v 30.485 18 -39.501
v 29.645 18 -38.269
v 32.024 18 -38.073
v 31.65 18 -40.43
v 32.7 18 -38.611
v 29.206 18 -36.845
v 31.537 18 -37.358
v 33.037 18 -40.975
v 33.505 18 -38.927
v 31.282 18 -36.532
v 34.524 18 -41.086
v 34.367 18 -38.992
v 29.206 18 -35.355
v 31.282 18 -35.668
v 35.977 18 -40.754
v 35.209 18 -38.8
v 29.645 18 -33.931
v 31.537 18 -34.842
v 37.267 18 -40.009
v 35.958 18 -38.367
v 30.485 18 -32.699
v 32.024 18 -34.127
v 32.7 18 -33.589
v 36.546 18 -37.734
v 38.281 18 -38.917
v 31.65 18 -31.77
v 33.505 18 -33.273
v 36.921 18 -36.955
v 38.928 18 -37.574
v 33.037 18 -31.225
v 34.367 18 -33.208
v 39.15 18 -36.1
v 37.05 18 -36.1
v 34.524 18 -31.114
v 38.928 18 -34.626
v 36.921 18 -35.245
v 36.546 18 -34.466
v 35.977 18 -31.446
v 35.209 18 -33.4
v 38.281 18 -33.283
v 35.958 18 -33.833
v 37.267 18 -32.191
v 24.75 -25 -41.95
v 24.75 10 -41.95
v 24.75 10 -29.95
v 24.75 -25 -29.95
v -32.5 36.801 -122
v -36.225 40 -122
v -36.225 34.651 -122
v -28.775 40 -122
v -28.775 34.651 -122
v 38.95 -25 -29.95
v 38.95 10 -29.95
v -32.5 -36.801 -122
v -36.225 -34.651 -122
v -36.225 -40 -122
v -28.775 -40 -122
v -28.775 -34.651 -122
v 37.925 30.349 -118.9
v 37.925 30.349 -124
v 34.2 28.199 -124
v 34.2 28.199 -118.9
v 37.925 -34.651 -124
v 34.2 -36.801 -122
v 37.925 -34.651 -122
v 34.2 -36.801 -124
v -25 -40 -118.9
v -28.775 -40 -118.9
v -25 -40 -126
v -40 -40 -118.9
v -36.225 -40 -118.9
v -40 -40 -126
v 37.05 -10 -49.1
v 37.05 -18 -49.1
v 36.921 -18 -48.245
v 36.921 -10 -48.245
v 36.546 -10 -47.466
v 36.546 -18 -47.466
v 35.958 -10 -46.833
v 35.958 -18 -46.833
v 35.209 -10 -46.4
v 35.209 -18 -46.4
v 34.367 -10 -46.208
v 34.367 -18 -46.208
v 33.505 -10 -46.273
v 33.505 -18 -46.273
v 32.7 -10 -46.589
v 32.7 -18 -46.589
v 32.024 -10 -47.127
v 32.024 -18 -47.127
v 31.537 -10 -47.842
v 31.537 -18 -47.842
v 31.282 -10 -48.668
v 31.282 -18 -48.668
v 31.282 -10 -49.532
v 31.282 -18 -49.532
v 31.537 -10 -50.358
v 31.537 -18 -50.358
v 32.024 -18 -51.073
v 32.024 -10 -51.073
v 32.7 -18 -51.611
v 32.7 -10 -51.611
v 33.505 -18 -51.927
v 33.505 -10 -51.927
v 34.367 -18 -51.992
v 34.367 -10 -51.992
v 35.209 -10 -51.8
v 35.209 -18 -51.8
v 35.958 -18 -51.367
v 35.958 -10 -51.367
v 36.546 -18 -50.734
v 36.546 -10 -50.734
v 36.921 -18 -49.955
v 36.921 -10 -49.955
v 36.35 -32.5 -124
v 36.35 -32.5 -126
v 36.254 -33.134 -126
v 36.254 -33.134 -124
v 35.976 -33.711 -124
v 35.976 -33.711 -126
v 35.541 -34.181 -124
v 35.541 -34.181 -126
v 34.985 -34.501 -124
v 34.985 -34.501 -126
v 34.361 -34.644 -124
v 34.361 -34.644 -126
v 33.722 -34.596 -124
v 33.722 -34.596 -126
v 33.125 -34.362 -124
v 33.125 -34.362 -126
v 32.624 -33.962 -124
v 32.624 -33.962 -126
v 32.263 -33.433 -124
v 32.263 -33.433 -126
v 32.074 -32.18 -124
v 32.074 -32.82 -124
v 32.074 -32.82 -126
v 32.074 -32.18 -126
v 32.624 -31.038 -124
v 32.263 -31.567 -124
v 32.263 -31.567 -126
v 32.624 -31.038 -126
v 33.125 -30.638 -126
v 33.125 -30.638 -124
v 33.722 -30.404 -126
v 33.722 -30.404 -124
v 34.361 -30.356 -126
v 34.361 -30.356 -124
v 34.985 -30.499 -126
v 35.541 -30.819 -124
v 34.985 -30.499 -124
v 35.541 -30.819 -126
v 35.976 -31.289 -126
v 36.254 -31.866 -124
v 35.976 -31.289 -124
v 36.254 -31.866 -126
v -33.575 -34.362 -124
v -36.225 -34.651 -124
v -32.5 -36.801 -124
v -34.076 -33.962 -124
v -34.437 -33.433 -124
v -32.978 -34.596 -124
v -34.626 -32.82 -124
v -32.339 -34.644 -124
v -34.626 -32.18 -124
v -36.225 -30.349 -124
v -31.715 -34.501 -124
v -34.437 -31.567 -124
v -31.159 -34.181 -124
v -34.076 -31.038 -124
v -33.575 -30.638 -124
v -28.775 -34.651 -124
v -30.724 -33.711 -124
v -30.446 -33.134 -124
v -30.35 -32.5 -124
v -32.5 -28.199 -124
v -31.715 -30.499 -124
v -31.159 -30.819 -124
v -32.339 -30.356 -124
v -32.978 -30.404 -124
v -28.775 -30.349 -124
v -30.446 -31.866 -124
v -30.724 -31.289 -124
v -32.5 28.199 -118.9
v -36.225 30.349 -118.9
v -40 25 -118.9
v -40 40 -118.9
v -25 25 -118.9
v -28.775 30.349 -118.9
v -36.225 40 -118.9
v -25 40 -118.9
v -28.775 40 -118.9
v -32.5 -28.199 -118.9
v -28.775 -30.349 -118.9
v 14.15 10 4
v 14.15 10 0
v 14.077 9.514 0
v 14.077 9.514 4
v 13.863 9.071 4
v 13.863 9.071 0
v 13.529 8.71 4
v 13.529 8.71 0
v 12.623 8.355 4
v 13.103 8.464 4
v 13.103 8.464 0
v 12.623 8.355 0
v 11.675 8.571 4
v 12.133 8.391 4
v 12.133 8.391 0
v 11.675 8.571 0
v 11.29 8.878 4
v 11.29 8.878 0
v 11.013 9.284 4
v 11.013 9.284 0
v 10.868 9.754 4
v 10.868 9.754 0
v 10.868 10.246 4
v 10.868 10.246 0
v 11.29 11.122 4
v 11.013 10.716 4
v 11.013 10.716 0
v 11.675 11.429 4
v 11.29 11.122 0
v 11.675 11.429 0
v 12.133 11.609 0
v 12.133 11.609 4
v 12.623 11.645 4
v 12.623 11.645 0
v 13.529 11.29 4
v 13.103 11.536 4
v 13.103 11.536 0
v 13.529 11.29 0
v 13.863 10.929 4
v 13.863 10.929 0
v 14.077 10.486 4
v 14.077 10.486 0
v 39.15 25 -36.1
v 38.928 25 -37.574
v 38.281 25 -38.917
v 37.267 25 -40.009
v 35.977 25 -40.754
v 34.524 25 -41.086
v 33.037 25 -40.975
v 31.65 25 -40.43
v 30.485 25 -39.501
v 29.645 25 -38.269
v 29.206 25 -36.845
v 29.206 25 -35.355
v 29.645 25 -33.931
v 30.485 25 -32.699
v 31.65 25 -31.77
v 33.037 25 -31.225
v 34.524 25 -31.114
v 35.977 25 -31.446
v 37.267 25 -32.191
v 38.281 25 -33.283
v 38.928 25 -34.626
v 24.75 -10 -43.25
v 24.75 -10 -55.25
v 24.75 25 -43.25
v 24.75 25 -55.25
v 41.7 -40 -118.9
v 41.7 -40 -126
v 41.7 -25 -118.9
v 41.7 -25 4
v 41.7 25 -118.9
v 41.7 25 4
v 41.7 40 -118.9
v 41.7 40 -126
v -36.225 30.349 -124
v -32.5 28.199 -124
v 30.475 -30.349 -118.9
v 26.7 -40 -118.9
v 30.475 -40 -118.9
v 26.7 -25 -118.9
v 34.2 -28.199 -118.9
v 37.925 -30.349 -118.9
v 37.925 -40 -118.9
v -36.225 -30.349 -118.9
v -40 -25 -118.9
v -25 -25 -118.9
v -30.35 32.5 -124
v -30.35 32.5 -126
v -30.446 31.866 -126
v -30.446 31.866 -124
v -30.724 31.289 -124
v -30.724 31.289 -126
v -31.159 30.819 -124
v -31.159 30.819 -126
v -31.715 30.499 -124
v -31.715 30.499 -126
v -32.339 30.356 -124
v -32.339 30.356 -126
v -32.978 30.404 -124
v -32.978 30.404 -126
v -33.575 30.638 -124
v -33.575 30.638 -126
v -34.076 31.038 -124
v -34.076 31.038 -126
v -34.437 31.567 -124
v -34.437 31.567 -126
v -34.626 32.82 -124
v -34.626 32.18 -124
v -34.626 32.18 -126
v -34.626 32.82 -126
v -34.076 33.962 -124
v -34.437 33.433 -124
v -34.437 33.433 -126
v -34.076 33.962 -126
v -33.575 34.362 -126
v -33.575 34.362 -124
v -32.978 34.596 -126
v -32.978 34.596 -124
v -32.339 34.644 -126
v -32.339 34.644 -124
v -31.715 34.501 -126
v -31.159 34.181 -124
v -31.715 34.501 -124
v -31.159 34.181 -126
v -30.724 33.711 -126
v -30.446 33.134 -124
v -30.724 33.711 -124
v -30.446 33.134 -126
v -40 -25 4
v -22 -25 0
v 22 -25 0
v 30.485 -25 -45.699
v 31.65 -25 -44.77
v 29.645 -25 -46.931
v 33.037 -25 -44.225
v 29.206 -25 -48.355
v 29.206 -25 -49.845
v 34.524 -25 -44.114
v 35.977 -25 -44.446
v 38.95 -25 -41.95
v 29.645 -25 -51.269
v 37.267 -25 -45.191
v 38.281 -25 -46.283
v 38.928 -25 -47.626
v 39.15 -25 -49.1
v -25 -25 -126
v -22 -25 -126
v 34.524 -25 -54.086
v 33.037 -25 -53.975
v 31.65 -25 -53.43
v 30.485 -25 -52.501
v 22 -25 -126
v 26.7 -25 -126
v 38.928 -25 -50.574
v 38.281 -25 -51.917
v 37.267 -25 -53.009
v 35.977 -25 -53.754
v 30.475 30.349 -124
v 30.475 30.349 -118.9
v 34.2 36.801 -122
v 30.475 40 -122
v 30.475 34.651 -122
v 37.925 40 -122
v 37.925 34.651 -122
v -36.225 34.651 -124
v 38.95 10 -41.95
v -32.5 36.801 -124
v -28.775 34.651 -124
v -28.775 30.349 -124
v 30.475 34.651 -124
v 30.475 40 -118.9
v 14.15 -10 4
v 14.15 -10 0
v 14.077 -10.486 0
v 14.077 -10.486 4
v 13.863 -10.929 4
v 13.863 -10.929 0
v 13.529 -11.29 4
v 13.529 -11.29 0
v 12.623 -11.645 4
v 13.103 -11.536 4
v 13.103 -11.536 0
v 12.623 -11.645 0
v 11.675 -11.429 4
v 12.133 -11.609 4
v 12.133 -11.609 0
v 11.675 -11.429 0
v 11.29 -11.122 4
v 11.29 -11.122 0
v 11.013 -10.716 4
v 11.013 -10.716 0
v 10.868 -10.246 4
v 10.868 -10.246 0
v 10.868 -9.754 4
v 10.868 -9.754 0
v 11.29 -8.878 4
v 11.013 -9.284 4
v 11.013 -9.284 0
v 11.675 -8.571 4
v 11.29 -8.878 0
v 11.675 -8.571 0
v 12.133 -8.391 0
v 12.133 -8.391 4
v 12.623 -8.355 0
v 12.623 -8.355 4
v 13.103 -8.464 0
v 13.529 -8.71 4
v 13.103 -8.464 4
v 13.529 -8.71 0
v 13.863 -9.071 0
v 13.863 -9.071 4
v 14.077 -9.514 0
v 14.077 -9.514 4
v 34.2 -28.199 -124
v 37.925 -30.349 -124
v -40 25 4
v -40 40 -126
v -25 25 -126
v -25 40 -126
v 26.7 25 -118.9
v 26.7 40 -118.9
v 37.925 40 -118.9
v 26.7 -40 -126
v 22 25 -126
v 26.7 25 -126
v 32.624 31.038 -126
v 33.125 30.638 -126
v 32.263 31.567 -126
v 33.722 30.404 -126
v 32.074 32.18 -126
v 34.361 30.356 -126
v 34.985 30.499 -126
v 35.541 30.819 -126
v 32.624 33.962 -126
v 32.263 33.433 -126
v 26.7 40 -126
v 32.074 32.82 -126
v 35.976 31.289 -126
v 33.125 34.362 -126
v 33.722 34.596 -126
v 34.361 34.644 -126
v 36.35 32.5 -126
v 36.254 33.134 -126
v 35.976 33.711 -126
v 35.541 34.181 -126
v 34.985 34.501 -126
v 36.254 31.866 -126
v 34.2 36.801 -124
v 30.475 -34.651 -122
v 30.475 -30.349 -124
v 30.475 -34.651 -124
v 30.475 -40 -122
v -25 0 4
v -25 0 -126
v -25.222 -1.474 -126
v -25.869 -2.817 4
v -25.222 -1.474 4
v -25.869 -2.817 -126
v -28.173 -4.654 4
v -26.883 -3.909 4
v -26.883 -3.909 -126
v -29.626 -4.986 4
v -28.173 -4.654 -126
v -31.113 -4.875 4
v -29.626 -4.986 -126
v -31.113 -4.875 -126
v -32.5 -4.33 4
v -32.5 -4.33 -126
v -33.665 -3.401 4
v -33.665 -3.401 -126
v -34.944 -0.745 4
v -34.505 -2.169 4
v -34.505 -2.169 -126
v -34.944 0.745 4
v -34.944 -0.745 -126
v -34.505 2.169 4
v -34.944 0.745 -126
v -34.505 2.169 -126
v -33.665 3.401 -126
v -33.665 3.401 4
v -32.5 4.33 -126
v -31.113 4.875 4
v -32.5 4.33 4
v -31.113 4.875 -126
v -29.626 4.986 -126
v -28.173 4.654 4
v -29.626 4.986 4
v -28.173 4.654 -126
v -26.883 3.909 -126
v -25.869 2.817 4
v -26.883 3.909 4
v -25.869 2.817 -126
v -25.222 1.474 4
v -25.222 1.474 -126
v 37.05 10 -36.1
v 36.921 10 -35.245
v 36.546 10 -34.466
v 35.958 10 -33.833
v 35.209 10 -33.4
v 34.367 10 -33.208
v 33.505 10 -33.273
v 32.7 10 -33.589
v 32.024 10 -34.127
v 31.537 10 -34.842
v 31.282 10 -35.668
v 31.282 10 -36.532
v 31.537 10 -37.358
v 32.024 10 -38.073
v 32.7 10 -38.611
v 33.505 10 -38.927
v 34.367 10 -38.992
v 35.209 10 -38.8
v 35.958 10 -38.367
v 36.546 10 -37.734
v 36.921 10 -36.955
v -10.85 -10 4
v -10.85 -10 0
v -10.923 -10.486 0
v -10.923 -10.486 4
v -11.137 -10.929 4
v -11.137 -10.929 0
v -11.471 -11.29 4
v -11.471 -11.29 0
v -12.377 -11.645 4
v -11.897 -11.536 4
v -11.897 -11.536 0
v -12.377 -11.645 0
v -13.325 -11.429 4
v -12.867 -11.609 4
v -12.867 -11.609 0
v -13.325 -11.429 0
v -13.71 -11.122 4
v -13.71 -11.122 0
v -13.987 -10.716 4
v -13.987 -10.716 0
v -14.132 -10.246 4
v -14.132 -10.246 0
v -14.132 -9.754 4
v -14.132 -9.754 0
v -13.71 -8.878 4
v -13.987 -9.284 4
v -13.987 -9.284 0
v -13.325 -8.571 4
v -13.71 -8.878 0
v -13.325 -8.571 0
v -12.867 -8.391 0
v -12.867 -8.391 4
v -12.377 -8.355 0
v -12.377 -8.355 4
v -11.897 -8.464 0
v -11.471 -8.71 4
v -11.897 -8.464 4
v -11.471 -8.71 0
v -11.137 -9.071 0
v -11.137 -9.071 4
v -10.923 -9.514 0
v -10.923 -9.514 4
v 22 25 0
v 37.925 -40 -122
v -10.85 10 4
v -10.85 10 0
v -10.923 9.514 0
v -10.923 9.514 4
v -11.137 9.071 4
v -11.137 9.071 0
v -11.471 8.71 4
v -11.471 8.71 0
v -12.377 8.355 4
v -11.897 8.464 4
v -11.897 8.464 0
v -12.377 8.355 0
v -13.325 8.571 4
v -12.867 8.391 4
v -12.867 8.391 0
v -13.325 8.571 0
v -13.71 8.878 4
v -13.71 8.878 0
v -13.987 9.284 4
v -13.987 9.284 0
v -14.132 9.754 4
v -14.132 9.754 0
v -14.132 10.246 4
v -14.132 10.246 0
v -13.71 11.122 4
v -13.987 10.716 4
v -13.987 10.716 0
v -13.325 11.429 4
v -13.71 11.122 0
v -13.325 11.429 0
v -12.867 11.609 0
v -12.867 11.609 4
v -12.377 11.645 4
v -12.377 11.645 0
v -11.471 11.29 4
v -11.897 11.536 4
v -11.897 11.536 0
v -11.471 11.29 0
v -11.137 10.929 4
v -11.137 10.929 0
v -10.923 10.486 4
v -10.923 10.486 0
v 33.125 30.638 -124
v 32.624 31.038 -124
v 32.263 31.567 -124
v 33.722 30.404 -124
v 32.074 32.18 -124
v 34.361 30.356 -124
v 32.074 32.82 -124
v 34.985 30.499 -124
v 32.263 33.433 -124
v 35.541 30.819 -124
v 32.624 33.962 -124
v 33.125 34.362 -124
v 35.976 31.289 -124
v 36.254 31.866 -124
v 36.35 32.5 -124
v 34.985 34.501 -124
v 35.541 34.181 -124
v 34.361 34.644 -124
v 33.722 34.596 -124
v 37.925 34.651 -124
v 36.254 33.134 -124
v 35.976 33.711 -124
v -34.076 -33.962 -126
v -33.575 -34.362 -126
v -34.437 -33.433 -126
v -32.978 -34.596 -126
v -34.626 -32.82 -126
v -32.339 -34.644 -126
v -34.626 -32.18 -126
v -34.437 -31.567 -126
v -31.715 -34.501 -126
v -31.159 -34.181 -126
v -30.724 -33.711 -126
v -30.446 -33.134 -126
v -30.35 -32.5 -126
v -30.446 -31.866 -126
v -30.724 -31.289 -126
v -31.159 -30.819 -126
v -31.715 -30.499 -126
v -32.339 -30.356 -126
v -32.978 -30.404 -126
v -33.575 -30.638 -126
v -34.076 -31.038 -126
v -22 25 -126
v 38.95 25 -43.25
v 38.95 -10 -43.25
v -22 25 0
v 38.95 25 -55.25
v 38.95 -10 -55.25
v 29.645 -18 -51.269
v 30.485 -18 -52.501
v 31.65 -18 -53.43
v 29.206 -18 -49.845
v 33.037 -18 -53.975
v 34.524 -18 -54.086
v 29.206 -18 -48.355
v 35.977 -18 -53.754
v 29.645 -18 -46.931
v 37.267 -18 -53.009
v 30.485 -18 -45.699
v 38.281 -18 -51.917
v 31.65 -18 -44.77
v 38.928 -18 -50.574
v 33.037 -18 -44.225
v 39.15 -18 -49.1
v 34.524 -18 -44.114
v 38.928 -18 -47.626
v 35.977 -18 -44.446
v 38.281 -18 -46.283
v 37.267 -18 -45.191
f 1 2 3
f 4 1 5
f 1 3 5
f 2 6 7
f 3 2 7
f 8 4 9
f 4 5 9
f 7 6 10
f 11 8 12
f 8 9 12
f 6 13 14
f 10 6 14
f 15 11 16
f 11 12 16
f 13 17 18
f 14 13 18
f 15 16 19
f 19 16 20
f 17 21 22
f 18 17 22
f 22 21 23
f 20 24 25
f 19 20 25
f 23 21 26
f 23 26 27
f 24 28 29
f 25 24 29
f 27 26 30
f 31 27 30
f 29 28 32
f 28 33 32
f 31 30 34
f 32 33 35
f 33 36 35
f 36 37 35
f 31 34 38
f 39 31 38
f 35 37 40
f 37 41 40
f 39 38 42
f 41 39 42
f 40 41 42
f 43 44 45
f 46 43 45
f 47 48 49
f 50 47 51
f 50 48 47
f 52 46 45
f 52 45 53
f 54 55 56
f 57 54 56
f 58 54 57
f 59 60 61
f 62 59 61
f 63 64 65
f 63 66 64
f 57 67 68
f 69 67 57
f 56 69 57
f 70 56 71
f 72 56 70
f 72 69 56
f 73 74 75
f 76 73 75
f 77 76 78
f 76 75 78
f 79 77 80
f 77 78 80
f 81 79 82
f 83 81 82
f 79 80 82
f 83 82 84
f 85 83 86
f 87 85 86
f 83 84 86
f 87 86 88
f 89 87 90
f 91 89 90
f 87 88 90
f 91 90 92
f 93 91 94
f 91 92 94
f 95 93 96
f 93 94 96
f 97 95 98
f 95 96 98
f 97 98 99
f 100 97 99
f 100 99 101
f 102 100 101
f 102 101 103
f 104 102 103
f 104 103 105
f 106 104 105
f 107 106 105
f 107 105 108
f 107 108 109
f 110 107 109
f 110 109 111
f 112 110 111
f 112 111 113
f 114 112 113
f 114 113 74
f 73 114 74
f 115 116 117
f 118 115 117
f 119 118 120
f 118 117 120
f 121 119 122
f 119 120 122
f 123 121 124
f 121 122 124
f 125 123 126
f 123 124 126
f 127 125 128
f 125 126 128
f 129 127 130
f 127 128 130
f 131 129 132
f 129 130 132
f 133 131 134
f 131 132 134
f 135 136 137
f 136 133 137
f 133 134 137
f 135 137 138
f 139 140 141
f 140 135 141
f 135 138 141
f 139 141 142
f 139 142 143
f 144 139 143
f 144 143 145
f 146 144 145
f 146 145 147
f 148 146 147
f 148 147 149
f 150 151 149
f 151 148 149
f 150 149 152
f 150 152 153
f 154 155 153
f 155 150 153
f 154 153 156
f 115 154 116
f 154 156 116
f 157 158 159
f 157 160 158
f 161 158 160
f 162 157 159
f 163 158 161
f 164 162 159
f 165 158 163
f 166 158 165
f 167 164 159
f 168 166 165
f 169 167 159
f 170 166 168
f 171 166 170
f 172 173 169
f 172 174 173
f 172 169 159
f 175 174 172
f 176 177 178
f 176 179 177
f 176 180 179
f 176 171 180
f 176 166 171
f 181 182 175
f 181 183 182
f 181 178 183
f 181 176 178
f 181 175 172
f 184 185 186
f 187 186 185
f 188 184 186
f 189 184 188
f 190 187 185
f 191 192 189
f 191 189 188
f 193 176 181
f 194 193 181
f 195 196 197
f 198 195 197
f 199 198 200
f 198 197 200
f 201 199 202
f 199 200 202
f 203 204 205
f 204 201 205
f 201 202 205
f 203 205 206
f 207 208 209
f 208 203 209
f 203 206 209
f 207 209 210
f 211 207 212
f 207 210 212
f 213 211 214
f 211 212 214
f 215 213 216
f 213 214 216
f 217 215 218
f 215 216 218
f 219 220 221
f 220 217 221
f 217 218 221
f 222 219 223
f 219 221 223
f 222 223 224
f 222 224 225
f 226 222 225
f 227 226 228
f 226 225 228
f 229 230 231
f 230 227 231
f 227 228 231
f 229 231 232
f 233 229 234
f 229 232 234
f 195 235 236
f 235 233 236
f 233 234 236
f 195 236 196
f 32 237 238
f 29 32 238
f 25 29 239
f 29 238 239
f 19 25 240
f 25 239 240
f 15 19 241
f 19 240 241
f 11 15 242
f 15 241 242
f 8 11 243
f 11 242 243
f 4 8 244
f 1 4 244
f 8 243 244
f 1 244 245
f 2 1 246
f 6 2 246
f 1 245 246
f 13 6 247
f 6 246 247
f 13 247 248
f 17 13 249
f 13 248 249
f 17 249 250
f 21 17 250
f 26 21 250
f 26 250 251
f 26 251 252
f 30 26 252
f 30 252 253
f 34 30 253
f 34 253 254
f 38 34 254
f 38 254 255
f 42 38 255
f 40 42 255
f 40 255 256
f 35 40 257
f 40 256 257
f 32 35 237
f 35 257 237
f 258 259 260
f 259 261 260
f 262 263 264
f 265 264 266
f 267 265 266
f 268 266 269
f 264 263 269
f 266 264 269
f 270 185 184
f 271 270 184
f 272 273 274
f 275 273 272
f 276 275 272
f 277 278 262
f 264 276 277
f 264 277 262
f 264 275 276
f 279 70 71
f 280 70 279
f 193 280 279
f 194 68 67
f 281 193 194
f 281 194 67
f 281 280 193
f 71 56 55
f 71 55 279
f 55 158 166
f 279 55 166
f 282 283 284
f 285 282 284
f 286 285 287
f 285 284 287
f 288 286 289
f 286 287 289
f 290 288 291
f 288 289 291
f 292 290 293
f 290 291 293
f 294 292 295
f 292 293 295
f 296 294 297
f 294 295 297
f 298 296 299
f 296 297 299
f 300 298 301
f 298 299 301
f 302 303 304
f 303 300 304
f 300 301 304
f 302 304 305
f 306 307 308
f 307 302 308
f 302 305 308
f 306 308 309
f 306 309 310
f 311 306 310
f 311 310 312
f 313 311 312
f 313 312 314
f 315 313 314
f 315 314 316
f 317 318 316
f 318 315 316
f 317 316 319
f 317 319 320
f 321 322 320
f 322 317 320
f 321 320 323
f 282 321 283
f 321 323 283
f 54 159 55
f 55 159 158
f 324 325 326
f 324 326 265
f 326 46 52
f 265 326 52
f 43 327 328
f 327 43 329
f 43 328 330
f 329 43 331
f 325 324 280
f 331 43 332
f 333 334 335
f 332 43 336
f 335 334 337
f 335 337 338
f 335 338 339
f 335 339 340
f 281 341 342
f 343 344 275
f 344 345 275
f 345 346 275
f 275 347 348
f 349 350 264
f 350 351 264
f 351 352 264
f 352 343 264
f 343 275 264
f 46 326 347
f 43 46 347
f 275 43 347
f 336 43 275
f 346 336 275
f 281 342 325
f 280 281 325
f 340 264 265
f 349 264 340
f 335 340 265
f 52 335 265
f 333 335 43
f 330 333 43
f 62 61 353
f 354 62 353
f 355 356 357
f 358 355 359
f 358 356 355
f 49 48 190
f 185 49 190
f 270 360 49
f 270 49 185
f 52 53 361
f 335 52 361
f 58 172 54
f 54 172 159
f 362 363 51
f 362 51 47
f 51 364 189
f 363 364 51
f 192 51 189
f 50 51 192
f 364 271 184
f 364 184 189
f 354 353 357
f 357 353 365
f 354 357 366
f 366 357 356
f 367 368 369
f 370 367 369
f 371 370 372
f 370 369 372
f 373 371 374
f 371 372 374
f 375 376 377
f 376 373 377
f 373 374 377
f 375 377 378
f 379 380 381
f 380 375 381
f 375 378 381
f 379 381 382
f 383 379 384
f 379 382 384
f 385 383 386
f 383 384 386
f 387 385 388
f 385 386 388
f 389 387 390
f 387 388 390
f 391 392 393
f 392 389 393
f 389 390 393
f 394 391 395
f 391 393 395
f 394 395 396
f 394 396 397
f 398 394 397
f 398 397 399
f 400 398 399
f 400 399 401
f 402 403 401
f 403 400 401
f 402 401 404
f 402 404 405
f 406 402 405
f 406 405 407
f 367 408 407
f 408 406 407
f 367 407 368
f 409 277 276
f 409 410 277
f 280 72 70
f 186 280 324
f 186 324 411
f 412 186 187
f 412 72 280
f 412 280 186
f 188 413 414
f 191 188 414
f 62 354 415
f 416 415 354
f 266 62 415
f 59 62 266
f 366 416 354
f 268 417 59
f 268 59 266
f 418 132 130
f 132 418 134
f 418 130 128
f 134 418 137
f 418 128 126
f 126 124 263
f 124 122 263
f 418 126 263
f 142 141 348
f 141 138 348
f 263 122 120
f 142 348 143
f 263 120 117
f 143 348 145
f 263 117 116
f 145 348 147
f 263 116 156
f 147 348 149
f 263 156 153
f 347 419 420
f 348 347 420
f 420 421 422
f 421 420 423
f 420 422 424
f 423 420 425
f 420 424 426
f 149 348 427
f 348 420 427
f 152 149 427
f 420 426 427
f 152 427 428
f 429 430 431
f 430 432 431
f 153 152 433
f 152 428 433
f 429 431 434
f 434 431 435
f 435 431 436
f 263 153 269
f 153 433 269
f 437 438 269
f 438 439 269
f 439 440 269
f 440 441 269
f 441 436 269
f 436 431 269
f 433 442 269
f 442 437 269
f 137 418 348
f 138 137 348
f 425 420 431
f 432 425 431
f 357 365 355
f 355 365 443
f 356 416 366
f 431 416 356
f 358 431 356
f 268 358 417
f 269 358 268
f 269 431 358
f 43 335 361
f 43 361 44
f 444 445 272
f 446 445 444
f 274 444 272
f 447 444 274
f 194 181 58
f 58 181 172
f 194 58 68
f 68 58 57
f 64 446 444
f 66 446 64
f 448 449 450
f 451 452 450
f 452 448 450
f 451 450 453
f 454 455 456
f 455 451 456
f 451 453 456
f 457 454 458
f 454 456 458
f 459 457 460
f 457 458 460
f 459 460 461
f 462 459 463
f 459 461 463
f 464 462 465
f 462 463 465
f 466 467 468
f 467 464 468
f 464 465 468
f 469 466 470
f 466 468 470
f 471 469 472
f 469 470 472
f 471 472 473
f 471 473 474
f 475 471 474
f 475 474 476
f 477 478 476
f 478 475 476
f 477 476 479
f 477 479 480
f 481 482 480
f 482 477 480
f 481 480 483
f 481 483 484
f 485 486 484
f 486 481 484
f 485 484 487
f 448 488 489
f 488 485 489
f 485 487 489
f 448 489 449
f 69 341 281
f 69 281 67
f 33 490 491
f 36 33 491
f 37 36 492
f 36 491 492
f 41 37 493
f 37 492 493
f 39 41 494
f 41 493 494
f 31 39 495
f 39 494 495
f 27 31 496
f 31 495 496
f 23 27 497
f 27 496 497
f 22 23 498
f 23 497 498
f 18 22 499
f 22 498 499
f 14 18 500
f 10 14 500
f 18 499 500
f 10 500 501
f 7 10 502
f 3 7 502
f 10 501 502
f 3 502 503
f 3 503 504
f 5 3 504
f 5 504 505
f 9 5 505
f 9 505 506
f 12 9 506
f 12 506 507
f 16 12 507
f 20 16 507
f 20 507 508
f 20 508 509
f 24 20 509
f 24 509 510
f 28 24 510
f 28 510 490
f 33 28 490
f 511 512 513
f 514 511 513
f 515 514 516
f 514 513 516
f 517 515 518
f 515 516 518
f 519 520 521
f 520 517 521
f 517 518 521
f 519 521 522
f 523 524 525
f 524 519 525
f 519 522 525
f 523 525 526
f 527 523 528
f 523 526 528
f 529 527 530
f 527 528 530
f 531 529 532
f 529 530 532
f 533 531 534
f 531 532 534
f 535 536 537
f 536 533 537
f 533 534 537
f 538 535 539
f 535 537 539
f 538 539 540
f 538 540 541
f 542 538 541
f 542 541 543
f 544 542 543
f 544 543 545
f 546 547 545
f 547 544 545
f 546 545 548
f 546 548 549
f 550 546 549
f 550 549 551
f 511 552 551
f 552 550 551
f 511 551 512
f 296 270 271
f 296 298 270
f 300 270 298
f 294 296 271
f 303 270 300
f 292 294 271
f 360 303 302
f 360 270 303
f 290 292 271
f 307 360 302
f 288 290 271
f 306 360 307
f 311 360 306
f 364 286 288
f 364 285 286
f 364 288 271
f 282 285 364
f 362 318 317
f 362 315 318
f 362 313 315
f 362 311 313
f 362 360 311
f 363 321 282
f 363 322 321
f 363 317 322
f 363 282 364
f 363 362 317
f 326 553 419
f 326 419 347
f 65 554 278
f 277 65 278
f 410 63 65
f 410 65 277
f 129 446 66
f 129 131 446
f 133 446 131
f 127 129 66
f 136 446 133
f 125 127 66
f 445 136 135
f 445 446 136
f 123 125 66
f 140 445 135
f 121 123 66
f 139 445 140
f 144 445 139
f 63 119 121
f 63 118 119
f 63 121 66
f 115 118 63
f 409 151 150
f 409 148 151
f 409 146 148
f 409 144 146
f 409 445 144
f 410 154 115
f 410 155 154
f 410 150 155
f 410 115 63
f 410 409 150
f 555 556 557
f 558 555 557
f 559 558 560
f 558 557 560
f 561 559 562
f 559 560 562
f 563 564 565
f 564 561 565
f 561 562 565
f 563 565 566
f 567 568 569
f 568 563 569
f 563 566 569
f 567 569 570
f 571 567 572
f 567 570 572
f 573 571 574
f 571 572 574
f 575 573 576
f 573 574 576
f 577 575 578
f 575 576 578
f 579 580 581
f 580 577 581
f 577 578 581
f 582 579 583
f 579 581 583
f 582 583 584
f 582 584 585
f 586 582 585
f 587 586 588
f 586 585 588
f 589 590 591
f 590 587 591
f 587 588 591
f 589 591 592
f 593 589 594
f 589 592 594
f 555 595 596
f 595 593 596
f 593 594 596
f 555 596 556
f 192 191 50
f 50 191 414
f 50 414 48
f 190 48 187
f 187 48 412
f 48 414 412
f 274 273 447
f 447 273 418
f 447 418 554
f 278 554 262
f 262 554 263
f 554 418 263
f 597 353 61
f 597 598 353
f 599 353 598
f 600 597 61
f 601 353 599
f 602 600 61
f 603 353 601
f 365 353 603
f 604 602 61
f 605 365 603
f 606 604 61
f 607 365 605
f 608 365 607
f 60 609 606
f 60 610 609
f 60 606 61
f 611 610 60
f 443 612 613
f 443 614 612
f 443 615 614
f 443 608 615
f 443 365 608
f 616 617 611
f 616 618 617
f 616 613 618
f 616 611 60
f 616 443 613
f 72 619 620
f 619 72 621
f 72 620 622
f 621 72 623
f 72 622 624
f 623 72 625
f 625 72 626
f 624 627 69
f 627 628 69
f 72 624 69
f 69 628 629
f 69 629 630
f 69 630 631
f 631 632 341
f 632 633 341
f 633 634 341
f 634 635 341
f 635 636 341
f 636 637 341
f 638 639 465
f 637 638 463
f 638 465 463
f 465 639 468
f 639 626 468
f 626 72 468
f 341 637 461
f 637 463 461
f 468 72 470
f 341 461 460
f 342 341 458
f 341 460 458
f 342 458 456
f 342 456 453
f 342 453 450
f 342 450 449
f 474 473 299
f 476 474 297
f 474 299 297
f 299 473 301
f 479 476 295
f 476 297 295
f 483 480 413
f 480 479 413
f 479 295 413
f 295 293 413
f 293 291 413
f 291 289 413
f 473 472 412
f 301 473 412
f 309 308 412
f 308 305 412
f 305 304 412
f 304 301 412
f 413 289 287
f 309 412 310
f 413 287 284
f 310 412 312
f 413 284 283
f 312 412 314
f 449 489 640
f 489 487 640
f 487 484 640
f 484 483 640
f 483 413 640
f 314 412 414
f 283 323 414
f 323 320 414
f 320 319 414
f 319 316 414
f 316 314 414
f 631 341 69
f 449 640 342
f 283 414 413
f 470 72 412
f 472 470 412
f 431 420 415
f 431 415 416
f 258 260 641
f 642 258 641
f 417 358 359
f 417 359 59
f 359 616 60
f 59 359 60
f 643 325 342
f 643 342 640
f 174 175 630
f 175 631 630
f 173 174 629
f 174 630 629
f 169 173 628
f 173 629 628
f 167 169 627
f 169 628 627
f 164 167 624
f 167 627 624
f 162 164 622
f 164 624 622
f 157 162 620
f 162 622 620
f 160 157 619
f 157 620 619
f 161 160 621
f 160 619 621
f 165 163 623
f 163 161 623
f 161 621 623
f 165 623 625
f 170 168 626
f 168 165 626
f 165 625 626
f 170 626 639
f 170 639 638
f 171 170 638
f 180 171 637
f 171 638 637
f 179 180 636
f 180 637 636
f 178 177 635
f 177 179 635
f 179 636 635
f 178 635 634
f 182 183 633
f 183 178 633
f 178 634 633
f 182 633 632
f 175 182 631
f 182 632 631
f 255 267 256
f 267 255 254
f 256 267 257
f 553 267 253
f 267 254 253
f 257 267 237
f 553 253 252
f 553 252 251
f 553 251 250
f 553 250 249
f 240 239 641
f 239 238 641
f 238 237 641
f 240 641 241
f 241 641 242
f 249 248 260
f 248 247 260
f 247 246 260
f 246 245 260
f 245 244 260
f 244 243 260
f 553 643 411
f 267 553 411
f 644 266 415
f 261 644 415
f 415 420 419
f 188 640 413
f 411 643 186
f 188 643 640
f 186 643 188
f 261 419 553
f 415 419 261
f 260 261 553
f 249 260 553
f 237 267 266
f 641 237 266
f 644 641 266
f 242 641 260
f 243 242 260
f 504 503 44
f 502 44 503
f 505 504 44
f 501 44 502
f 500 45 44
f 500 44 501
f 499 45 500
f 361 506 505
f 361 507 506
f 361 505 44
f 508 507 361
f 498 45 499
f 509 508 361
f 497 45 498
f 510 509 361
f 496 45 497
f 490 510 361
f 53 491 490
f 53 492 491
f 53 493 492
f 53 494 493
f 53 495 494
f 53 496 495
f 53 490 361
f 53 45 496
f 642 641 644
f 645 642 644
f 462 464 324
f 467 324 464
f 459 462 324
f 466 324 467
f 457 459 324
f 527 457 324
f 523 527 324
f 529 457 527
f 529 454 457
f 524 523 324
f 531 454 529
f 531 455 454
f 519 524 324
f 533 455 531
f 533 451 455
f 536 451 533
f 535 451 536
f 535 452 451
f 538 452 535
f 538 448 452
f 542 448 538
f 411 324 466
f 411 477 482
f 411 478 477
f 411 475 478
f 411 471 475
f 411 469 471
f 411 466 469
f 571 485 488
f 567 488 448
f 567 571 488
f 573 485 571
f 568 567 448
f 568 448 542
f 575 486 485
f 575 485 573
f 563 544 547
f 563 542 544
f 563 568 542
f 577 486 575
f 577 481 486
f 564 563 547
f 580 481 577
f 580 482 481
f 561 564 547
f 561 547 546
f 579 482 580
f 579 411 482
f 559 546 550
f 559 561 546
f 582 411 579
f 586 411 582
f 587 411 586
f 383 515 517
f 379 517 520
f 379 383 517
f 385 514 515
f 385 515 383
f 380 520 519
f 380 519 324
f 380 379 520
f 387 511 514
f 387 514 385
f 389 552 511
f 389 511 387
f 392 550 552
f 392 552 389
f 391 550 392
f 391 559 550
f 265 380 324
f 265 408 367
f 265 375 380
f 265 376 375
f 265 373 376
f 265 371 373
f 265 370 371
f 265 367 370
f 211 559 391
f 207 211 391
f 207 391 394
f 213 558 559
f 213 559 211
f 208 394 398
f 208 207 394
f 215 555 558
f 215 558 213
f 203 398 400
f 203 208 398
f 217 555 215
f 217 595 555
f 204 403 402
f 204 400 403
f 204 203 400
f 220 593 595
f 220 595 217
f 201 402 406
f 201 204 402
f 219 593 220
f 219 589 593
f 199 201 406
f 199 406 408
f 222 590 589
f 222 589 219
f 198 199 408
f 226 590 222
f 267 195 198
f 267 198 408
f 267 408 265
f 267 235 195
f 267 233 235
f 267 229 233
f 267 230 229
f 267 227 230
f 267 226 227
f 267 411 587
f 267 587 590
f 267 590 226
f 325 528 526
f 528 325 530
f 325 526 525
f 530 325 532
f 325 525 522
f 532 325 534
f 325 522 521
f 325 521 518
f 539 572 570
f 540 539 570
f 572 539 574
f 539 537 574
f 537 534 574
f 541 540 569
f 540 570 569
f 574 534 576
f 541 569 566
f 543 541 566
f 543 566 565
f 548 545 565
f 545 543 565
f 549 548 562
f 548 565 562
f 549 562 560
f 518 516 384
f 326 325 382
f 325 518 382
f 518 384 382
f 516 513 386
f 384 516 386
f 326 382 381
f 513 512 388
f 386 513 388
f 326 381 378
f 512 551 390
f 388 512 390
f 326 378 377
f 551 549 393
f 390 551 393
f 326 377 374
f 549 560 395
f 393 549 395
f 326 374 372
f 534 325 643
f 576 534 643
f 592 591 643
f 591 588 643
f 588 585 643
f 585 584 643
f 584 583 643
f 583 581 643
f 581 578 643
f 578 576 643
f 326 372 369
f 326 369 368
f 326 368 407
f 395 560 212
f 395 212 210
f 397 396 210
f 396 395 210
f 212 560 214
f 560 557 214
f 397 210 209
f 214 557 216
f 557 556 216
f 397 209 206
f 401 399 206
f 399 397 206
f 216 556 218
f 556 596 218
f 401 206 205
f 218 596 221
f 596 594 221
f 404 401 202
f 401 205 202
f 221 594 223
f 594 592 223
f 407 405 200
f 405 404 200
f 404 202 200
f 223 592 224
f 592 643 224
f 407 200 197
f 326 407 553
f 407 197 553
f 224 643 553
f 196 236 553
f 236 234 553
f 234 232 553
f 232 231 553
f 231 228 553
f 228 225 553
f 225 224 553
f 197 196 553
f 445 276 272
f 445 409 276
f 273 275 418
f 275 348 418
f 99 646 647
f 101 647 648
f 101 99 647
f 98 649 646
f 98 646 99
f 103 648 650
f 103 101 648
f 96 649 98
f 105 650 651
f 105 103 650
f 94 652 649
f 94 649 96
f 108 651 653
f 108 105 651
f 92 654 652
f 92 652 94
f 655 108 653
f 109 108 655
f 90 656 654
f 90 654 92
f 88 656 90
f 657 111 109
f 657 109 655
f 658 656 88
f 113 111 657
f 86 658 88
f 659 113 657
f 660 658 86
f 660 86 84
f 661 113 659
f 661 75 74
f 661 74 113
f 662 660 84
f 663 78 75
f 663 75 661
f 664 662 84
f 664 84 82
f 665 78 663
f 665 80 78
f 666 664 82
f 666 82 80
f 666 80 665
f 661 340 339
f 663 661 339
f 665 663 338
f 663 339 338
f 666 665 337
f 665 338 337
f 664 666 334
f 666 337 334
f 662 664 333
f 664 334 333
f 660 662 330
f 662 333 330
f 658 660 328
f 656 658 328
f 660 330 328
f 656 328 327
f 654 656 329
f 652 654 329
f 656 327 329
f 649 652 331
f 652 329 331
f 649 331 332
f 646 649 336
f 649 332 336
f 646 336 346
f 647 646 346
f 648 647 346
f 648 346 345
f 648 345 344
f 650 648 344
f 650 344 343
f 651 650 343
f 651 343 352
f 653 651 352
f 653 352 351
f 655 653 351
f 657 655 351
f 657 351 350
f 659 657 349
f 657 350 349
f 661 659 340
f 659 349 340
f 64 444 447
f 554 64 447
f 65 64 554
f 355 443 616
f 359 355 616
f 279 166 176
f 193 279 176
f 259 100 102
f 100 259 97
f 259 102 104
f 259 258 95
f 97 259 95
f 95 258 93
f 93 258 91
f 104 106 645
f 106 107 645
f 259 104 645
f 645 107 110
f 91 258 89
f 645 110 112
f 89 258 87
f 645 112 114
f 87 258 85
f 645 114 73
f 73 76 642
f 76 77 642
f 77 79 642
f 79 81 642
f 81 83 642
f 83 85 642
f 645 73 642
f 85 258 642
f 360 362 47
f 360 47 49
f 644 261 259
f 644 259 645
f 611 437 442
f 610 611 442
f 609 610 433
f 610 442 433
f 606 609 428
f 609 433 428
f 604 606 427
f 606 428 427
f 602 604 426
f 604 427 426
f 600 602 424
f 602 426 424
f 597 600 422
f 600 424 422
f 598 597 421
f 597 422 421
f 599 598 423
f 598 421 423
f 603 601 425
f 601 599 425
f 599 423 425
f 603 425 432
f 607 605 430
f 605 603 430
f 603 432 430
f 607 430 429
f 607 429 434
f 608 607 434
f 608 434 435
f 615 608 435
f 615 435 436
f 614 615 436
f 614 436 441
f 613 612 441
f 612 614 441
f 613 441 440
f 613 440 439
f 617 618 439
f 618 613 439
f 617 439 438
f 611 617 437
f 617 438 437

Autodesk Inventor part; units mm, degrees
sketch "S-ProbeHead-BaseSkizze" plane through (0, 0, 0) normal (0, 0, 1) x (1, 0, 0)
  line L0 (-40, 40) -> (40, 40)
  line L1 (40, 40) -> (40, -40)
  line L2 (40, -40) -> (-40, -40)
  line L3 (-40, -40) -> (-40, 40)
  line L4 (-40, 40) -> (40, -40) construction
  line L5 (40, 40) -> (-40, -40) construction
  line L6 (-56.34, 0) -> (58.04, 0) construction
  circle A0 centre (-30, 0) radius 5
  line L7 (0, 83.0683) -> (0, -88.0384) construction
  line L8 (-7.5, 58.6245) -> (-7.5, -60.8735) construction
  line L9 (-16, 21) -> (16, 21) construction
  line L10 (16, 21) -> (16, -21) construction
  line L11 (16, -21) -> (-16, -21) construction
  line L12 (-16, -21) -> (-16, 21) construction
  line L13 (-16, 21) -> (16, -21) construction
  line L14 (16, 21) -> (-16, -21) construction
  circle A1 centre (-12.5, -10) radius 1.65
  circle A2 centre (-12.5, 10) radius 1.65
  circle A3 centre (12.5, -10) radius 1.65
  circle A4 centre (12.5, 10) radius 1.65
  line L15 (-20, 57.6709) -> (-20, -63.5946)
  line L16 (7.5, 58.6245) -> (7.5, -60.8735) construction
  line L17 (20, 57.6709) -> (20, -63.5946)
  line L18 (41.7, 25) -> (-40, 25)
  line L19 (-40, 25) -> (-40, -25)
  line L20 (-40, -25) -> (41.7, -25)
  line L21 (41.7, -25) -> (41.7, 25)
  line L22 (22, 25) -> (22, -25)
  line L23 (-22, -25) -> (-22, 25)
  point P0 (0, 0)
  point P1 (41.7, 0)
  dimension "d1" = 80
  dimension "d2" = 80
  dimension "d4" = 10
  dimension "d6" = 30
  dimension "d20" = 7.5
  dimension "d21" = 32
  dimension "d22" = 42
  dimension "d23" = 3.3
  dimension "d24" = 10
  dimension "d25" = 12.5
  dimension "d26" = 20
  dimension "d27" = 50
  dimension "d30" = 20
  dimension "d31" = 21.7
  dimension "d32" = 2
  dimension "d37" = 2
extrude "BasePlate" add sketch "S-ProbeHead-BaseSkizze" along normal blind 4 contours L18 L23 L20 L3 | L18 L17 L20 L15 | L15 L20 L23 L18 | L18 L22 L20 L17 | L18 L21 L20 L1 | L1 L20 L22 L18
ref_plane "Endfläche-ProbeHeadarme" through (0, 0, -126) normal (0, 0, 1) x (1, 0, 0)
ref_plane "ProfilDownside" through (0, 0, -56) normal (0, 0, 1) x (1, 0, 0)
extrude "Arms" add sketch "S-ProbeHead-BaseSkizze" against normal up to surface (126 mm away) contours L18 L23 L20 L3 | L18 L21 L20 L1 | L1 L20 L22 L18
ref_plane "Z-UpperBelt" through (0, 0, -36.1) normal (0, 0, 1) x (1, 0, 0)
ref_plane "Z-LowerBelt" through (0, 0, -49.1) normal (0, 0, 1) x (1, 0, 0)
ref_plane "X-Belts" through (26.75, 0, 0) normal (1, 0, 0) x (0, 1, 0)
sketch "S-Tensioners" plane through (-40, -25, 4) normal (0, -1, 0) x (1, 0, 0)
  line L0 (64.75, -47.25) -> (78.95, -47.25)
  line L1 (78.95, -47.25) -> (78.95, -58.95)
  line L2 (78.95, -58.95) -> (64.75, -58.95)
  line L3 (64.75, -58.95) -> (64.75, -47.25)
  line L4 (64.75, -47.25) -> (78.95, -58.95) construction
  line L5 (78.95, -47.25) -> (64.75, -58.95) construction
  line L6 (71.85, -74) -> (71.85, 12.5724) construction
  line L7 (-16.34, -40.1) -> (98.04, -40.1) construction
  line L8 (-16.34, -53.1) -> (98.04, -53.1) construction
  circle A0 centre (74.15, -53.1) radius 2.9
  line L9 (64.75, -34.25) -> (78.95, -34.25)
  line L10 (78.95, -34.25) -> (78.95, -45.95)
  line L11 (78.95, -45.95) -> (64.75, -45.95)
  line L12 (64.75, -45.95) -> (64.75, -34.25)
  line L13 (64.75, -34.25) -> (78.95, -45.95) construction
  line L14 (78.95, -34.25) -> (64.75, -45.95) construction
  circle A1 centre (74.15, -40.1) radius 2.9
  circle A2 centre (74.15, -40.1) radius 5
  circle A3 centre (74.15, -53.1) radius 5
  line L15 (66.75, 41.0869) -> (66.75, -158.5145) construction
  line L16 (78.95, -34.25) -> (64.75, -34.25)
  line L17 (64.75, -34.25) -> (64.75, -33.95)
  line L18 (64.75, -33.95) -> (78.95, -33.95)
  line L19 (78.95, -33.95) -> (78.95, -34.25)
  line L20 (78.95, -58.95) -> (64.75, -58.95)
  line L21 (64.75, -58.95) -> (64.75, -59.25)
  line L22 (64.75, -59.25) -> (78.95, -59.25)
  line L23 (78.95, -59.25) -> (78.95, -58.95)
  point P0 (40, -4)
  point P1 (78.95, -40.1)
  point P2 (78.95, -53.1)
  dimension "d38" = 14.2
  dimension "d39" = 11.7
  dimension "d42" = 5.8
  dimension "d43" = 14.2
  dimension "d44" = 11.7
  dimension "d45" = 5.8
  dimension "d53" = 4.8
  dimension "d54" = 4.8
  dimension "d55" = 10
  dimension "d56" = 10
  dimension "d58" = 7.4
  dimension "d59" = 7.4
  dimension "d79" = 0.3
  dimension "d80" = 0.3
extrude "Ex-Tensioners1-Holes" cut sketch "S-Tensioners" against normal blind 50 contours A0 | A1
extrude "Ex-Tensioners2-SlideVolume" cut sketch "S-Tensioners" along normal blind 35 from surface at -50 contours L0 L1 A3 L2 L3 | L2 L23 L22 L21 | L1 A3 picked at (78.3167, -53.1)
extrude "Ex-Tensioners3-SlideVolume" cut sketch "S-Tensioners" against normal blind 35 contours L17 L18 L19 L9 | L9 L10 A2 L11 L12 | L10 A2 picked at (78.3167, -40.1)
extrude "Ex-Tensioners4-SrewHead" cut sketch "S-Tensioners" against normal blind 7 contours A3 L1 | L1 A3
extrude "Ex-Tensioners5-SrewHead" cut sketch "S-Tensioners" along normal blind 7 from surface at -50 contours A2 L10 | L10 A2
sketch "S-Anschraubpunkte-ProbeAntenna" plane through (0, 0, -126) normal (0, 0, 1) x (1, 0, 0)
  line L0 (-56.34, 0) -> (58.04, 0) construction
  line L1 (0, 74.3335) -> (0, -68.3114) construction
  line L2 (41.7, 25) -> (-40, 25) projected
  line L3 (41.7, -25) -> (41.7, 25) projected
  line L4 (-40, -25) -> (41.7, -25) projected
  line L5 (-40, 25) -> (-40, -25) projected
  line L6 (41.7, 25) -> (26.7, 25)
  line L7 (26.7, 25) -> (26.7, 40)
  line L8 (26.7, 40) -> (41.7, 40)
  line L9 (41.7, 40) -> (41.7, 25)
  line L10 (22, -25) -> (22, 25) projected
  line L11 (22, 25) -> (22, -25) projected
  line L12 (-22, 25) -> (-22, -25) projected
  line L13 (-22, -25) -> (-22, 25) projected
  line L14 (41.7, 32.5) -> (26.7, 32.5) construction
  line L15 (34.2, 40) -> (34.2, 25) construction
  circle A0 centre (34.2, 32.5) radius 2.15
  circle A1 centre (34.2, 32.5) radius 4 construction
  line L16 (0.85, 53.9557) -> (0.85, -47.9335) construction
  line L17 (-40, 25) -> (-25, 25)
  line L18 (-25, 25) -> (-25, 40)
  line L19 (-25, 40) -> (-40, 40)
  line L20 (-40, 40) -> (-40, 25)
  circle A2 centre (-32.5, 32.5) radius 2.15
  circle A3 centre (-32.5, 32.5) radius 4 construction
  line L21 (41.7, -25) -> (26.7, -25)
  line L22 (26.7, -25) -> (26.7, -40)
  line L23 (26.7, -40) -> (41.7, -40)
  line L24 (41.7, -40) -> (41.7, -25)
  circle A4 centre (34.2, -32.5) radius 2.15
  circle A5 centre (34.2, -32.5) radius 4 construction
  line L25 (-40, -40) -> (-40, -25)
  line L26 (-25, -40) -> (-40, -40)
  line L27 (-40, -25) -> (-25, -25)
  line L28 (-25, -25) -> (-25, -40)
  circle A6 centre (-32.5, -32.5) radius 4 construction
  circle A7 centre (-32.5, -32.5) radius 2.15
  line L29 (34.2, 28.1987) -> (30.475, 30.3494)
  line L30 (30.475, 30.3494) -> (30.475, 40)
  line L31 (30.475, 34.6506) -> (34.2, 36.8013)
  line L32 (34.2, 36.8013) -> (37.925, 34.6506)
  line L33 (37.925, 40) -> (37.925, 30.3494)
  line L34 (37.925, 30.3494) -> (34.2, 28.1987)
  line L35 (34.2, -28.1987) -> (30.475, -30.3494)
  line L36 (30.475, -30.3494) -> (30.475, -40)
  line L37 (30.475, -34.6506) -> (34.2, -36.8013)
  line L38 (34.2, -36.8013) -> (37.925, -34.6506)
  line L39 (37.925, -40) -> (37.925, -30.3494)
  line L40 (37.925, -30.3494) -> (34.2, -28.1987)
  line L41 (-32.5, 28.1987) -> (-28.775, 30.3494)
  line L42 (-28.775, 30.3494) -> (-28.775, 40)
  line L43 (-28.775, 34.6506) -> (-32.5, 36.8013)
  line L44 (-32.5, 36.8013) -> (-36.225, 34.6506)
  line L45 (-36.225, 40) -> (-36.225, 30.3494)
  line L46 (-36.225, 30.3494) -> (-32.5, 28.1987)
  line L47 (-36.225, -40) -> (-36.225, -30.3494)
  line L48 (-32.5, -36.8013) -> (-36.225, -34.6506)
  line L49 (-28.775, -34.6506) -> (-32.5, -36.8013)
  line L50 (-28.775, -30.3494) -> (-28.775, -40)
  line L51 (-32.5, -28.1987) -> (-28.775, -30.3494)
  line L52 (-36.225, -30.3494) -> (-32.5, -28.1987)
  point P0 (0, 0)
  dimension "d46" = 50
  dimension "d67" = 15
  dimension "d68" = 15
  dimension "d69" = 4.3
  dimension "d70" = 8
  dimension "d71" = 81.7
  dimension "d72" = 40.85
  dimension "d75" = 65
  dimension "d76" = 66.7
  dimension "d81" = 7.45
extrude "Ex-Anschraubpunkte-Eb1" add sketch "S-Anschraubpunkte-ProbeAntenna" along normal blind 2 contours L2 L7 L8 L30 L29 L34 L33 L9 | L24 L23 L39 L40 L35 L36 L22 L4 | L33 L32 L31 L30 L8 | L23 L36 L37 L38 L39 | L33 L34 L29 L30 L31 L32 | L2 L20 L19 L45 L46 L41 L42 L18 | L38 L37 L36 L35 L40 L39 | L28 L26 L50 L51 L52 L47 L25 L4 | L42 L43 L44 L45 L19 | L42 L41 L46 L45 L44 L43 | L26 L47 L48 L49 L50 | L49 L48 L47 L52 L51 L50
extrude "Ex-Anschraubpunkte-Eb2" add sketch "S-Anschraubpunkte-ProbeAntenna" along normal blind 2 from surface at 2 contours L2 L7 L8 L30 L29 L34 L33 L9 | L24 L23 L39 L40 L35 L36 L22 L4 | L33 L32 L31 L30 L8 | L23 L36 L37 L38 L39 | L2 L20 L19 L45 L46 L41 L42 L18 | L28 L26 L50 L51 L52 L47 L25 L4 | L42 L43 L44 L45 L19 | L26 L47 L48 L49 L50
extrude "Ex-Anschraubpunkte-Eb3" add sketch "S-Anschraubpunkte-ProbeAntenna" along normal blind 3.1 from surface at 4 contours L2 L7 L8 L30 L29 L34 L33 L9 | L24 L23 L39 L40 L35 L36 L22 L4 | L2 L20 L19 L45 L46 L41 L42 L18 | L28 L26 L50 L51 L52 L47 L25 L4
extrude "Ex-Anschraubpunkte-Eb4" [suppressed]
ref_plane "Anschraubpunkt-Spiegelebene" through (0.85, 53.9557, -126) normal (-1, 0, 0) x (0, -1, 0)
ref_plane "ProfilTopSide" through (0, 0, -16) normal (0, 0, 1) x (1, 0, 0)
equation "\"d43\" = d38"
equation "\"d44\" = d39"
equation "\"d45\" = d42"
equation "\"d53\" = d54"
equation "\"d55\" = d56"
equation "\"d58\" = d59"
equation "\"d80\" = d79"
equation "\"d72\" = 0.5 * d71"
properties part number "ProbeHead-BaseBody V3"
